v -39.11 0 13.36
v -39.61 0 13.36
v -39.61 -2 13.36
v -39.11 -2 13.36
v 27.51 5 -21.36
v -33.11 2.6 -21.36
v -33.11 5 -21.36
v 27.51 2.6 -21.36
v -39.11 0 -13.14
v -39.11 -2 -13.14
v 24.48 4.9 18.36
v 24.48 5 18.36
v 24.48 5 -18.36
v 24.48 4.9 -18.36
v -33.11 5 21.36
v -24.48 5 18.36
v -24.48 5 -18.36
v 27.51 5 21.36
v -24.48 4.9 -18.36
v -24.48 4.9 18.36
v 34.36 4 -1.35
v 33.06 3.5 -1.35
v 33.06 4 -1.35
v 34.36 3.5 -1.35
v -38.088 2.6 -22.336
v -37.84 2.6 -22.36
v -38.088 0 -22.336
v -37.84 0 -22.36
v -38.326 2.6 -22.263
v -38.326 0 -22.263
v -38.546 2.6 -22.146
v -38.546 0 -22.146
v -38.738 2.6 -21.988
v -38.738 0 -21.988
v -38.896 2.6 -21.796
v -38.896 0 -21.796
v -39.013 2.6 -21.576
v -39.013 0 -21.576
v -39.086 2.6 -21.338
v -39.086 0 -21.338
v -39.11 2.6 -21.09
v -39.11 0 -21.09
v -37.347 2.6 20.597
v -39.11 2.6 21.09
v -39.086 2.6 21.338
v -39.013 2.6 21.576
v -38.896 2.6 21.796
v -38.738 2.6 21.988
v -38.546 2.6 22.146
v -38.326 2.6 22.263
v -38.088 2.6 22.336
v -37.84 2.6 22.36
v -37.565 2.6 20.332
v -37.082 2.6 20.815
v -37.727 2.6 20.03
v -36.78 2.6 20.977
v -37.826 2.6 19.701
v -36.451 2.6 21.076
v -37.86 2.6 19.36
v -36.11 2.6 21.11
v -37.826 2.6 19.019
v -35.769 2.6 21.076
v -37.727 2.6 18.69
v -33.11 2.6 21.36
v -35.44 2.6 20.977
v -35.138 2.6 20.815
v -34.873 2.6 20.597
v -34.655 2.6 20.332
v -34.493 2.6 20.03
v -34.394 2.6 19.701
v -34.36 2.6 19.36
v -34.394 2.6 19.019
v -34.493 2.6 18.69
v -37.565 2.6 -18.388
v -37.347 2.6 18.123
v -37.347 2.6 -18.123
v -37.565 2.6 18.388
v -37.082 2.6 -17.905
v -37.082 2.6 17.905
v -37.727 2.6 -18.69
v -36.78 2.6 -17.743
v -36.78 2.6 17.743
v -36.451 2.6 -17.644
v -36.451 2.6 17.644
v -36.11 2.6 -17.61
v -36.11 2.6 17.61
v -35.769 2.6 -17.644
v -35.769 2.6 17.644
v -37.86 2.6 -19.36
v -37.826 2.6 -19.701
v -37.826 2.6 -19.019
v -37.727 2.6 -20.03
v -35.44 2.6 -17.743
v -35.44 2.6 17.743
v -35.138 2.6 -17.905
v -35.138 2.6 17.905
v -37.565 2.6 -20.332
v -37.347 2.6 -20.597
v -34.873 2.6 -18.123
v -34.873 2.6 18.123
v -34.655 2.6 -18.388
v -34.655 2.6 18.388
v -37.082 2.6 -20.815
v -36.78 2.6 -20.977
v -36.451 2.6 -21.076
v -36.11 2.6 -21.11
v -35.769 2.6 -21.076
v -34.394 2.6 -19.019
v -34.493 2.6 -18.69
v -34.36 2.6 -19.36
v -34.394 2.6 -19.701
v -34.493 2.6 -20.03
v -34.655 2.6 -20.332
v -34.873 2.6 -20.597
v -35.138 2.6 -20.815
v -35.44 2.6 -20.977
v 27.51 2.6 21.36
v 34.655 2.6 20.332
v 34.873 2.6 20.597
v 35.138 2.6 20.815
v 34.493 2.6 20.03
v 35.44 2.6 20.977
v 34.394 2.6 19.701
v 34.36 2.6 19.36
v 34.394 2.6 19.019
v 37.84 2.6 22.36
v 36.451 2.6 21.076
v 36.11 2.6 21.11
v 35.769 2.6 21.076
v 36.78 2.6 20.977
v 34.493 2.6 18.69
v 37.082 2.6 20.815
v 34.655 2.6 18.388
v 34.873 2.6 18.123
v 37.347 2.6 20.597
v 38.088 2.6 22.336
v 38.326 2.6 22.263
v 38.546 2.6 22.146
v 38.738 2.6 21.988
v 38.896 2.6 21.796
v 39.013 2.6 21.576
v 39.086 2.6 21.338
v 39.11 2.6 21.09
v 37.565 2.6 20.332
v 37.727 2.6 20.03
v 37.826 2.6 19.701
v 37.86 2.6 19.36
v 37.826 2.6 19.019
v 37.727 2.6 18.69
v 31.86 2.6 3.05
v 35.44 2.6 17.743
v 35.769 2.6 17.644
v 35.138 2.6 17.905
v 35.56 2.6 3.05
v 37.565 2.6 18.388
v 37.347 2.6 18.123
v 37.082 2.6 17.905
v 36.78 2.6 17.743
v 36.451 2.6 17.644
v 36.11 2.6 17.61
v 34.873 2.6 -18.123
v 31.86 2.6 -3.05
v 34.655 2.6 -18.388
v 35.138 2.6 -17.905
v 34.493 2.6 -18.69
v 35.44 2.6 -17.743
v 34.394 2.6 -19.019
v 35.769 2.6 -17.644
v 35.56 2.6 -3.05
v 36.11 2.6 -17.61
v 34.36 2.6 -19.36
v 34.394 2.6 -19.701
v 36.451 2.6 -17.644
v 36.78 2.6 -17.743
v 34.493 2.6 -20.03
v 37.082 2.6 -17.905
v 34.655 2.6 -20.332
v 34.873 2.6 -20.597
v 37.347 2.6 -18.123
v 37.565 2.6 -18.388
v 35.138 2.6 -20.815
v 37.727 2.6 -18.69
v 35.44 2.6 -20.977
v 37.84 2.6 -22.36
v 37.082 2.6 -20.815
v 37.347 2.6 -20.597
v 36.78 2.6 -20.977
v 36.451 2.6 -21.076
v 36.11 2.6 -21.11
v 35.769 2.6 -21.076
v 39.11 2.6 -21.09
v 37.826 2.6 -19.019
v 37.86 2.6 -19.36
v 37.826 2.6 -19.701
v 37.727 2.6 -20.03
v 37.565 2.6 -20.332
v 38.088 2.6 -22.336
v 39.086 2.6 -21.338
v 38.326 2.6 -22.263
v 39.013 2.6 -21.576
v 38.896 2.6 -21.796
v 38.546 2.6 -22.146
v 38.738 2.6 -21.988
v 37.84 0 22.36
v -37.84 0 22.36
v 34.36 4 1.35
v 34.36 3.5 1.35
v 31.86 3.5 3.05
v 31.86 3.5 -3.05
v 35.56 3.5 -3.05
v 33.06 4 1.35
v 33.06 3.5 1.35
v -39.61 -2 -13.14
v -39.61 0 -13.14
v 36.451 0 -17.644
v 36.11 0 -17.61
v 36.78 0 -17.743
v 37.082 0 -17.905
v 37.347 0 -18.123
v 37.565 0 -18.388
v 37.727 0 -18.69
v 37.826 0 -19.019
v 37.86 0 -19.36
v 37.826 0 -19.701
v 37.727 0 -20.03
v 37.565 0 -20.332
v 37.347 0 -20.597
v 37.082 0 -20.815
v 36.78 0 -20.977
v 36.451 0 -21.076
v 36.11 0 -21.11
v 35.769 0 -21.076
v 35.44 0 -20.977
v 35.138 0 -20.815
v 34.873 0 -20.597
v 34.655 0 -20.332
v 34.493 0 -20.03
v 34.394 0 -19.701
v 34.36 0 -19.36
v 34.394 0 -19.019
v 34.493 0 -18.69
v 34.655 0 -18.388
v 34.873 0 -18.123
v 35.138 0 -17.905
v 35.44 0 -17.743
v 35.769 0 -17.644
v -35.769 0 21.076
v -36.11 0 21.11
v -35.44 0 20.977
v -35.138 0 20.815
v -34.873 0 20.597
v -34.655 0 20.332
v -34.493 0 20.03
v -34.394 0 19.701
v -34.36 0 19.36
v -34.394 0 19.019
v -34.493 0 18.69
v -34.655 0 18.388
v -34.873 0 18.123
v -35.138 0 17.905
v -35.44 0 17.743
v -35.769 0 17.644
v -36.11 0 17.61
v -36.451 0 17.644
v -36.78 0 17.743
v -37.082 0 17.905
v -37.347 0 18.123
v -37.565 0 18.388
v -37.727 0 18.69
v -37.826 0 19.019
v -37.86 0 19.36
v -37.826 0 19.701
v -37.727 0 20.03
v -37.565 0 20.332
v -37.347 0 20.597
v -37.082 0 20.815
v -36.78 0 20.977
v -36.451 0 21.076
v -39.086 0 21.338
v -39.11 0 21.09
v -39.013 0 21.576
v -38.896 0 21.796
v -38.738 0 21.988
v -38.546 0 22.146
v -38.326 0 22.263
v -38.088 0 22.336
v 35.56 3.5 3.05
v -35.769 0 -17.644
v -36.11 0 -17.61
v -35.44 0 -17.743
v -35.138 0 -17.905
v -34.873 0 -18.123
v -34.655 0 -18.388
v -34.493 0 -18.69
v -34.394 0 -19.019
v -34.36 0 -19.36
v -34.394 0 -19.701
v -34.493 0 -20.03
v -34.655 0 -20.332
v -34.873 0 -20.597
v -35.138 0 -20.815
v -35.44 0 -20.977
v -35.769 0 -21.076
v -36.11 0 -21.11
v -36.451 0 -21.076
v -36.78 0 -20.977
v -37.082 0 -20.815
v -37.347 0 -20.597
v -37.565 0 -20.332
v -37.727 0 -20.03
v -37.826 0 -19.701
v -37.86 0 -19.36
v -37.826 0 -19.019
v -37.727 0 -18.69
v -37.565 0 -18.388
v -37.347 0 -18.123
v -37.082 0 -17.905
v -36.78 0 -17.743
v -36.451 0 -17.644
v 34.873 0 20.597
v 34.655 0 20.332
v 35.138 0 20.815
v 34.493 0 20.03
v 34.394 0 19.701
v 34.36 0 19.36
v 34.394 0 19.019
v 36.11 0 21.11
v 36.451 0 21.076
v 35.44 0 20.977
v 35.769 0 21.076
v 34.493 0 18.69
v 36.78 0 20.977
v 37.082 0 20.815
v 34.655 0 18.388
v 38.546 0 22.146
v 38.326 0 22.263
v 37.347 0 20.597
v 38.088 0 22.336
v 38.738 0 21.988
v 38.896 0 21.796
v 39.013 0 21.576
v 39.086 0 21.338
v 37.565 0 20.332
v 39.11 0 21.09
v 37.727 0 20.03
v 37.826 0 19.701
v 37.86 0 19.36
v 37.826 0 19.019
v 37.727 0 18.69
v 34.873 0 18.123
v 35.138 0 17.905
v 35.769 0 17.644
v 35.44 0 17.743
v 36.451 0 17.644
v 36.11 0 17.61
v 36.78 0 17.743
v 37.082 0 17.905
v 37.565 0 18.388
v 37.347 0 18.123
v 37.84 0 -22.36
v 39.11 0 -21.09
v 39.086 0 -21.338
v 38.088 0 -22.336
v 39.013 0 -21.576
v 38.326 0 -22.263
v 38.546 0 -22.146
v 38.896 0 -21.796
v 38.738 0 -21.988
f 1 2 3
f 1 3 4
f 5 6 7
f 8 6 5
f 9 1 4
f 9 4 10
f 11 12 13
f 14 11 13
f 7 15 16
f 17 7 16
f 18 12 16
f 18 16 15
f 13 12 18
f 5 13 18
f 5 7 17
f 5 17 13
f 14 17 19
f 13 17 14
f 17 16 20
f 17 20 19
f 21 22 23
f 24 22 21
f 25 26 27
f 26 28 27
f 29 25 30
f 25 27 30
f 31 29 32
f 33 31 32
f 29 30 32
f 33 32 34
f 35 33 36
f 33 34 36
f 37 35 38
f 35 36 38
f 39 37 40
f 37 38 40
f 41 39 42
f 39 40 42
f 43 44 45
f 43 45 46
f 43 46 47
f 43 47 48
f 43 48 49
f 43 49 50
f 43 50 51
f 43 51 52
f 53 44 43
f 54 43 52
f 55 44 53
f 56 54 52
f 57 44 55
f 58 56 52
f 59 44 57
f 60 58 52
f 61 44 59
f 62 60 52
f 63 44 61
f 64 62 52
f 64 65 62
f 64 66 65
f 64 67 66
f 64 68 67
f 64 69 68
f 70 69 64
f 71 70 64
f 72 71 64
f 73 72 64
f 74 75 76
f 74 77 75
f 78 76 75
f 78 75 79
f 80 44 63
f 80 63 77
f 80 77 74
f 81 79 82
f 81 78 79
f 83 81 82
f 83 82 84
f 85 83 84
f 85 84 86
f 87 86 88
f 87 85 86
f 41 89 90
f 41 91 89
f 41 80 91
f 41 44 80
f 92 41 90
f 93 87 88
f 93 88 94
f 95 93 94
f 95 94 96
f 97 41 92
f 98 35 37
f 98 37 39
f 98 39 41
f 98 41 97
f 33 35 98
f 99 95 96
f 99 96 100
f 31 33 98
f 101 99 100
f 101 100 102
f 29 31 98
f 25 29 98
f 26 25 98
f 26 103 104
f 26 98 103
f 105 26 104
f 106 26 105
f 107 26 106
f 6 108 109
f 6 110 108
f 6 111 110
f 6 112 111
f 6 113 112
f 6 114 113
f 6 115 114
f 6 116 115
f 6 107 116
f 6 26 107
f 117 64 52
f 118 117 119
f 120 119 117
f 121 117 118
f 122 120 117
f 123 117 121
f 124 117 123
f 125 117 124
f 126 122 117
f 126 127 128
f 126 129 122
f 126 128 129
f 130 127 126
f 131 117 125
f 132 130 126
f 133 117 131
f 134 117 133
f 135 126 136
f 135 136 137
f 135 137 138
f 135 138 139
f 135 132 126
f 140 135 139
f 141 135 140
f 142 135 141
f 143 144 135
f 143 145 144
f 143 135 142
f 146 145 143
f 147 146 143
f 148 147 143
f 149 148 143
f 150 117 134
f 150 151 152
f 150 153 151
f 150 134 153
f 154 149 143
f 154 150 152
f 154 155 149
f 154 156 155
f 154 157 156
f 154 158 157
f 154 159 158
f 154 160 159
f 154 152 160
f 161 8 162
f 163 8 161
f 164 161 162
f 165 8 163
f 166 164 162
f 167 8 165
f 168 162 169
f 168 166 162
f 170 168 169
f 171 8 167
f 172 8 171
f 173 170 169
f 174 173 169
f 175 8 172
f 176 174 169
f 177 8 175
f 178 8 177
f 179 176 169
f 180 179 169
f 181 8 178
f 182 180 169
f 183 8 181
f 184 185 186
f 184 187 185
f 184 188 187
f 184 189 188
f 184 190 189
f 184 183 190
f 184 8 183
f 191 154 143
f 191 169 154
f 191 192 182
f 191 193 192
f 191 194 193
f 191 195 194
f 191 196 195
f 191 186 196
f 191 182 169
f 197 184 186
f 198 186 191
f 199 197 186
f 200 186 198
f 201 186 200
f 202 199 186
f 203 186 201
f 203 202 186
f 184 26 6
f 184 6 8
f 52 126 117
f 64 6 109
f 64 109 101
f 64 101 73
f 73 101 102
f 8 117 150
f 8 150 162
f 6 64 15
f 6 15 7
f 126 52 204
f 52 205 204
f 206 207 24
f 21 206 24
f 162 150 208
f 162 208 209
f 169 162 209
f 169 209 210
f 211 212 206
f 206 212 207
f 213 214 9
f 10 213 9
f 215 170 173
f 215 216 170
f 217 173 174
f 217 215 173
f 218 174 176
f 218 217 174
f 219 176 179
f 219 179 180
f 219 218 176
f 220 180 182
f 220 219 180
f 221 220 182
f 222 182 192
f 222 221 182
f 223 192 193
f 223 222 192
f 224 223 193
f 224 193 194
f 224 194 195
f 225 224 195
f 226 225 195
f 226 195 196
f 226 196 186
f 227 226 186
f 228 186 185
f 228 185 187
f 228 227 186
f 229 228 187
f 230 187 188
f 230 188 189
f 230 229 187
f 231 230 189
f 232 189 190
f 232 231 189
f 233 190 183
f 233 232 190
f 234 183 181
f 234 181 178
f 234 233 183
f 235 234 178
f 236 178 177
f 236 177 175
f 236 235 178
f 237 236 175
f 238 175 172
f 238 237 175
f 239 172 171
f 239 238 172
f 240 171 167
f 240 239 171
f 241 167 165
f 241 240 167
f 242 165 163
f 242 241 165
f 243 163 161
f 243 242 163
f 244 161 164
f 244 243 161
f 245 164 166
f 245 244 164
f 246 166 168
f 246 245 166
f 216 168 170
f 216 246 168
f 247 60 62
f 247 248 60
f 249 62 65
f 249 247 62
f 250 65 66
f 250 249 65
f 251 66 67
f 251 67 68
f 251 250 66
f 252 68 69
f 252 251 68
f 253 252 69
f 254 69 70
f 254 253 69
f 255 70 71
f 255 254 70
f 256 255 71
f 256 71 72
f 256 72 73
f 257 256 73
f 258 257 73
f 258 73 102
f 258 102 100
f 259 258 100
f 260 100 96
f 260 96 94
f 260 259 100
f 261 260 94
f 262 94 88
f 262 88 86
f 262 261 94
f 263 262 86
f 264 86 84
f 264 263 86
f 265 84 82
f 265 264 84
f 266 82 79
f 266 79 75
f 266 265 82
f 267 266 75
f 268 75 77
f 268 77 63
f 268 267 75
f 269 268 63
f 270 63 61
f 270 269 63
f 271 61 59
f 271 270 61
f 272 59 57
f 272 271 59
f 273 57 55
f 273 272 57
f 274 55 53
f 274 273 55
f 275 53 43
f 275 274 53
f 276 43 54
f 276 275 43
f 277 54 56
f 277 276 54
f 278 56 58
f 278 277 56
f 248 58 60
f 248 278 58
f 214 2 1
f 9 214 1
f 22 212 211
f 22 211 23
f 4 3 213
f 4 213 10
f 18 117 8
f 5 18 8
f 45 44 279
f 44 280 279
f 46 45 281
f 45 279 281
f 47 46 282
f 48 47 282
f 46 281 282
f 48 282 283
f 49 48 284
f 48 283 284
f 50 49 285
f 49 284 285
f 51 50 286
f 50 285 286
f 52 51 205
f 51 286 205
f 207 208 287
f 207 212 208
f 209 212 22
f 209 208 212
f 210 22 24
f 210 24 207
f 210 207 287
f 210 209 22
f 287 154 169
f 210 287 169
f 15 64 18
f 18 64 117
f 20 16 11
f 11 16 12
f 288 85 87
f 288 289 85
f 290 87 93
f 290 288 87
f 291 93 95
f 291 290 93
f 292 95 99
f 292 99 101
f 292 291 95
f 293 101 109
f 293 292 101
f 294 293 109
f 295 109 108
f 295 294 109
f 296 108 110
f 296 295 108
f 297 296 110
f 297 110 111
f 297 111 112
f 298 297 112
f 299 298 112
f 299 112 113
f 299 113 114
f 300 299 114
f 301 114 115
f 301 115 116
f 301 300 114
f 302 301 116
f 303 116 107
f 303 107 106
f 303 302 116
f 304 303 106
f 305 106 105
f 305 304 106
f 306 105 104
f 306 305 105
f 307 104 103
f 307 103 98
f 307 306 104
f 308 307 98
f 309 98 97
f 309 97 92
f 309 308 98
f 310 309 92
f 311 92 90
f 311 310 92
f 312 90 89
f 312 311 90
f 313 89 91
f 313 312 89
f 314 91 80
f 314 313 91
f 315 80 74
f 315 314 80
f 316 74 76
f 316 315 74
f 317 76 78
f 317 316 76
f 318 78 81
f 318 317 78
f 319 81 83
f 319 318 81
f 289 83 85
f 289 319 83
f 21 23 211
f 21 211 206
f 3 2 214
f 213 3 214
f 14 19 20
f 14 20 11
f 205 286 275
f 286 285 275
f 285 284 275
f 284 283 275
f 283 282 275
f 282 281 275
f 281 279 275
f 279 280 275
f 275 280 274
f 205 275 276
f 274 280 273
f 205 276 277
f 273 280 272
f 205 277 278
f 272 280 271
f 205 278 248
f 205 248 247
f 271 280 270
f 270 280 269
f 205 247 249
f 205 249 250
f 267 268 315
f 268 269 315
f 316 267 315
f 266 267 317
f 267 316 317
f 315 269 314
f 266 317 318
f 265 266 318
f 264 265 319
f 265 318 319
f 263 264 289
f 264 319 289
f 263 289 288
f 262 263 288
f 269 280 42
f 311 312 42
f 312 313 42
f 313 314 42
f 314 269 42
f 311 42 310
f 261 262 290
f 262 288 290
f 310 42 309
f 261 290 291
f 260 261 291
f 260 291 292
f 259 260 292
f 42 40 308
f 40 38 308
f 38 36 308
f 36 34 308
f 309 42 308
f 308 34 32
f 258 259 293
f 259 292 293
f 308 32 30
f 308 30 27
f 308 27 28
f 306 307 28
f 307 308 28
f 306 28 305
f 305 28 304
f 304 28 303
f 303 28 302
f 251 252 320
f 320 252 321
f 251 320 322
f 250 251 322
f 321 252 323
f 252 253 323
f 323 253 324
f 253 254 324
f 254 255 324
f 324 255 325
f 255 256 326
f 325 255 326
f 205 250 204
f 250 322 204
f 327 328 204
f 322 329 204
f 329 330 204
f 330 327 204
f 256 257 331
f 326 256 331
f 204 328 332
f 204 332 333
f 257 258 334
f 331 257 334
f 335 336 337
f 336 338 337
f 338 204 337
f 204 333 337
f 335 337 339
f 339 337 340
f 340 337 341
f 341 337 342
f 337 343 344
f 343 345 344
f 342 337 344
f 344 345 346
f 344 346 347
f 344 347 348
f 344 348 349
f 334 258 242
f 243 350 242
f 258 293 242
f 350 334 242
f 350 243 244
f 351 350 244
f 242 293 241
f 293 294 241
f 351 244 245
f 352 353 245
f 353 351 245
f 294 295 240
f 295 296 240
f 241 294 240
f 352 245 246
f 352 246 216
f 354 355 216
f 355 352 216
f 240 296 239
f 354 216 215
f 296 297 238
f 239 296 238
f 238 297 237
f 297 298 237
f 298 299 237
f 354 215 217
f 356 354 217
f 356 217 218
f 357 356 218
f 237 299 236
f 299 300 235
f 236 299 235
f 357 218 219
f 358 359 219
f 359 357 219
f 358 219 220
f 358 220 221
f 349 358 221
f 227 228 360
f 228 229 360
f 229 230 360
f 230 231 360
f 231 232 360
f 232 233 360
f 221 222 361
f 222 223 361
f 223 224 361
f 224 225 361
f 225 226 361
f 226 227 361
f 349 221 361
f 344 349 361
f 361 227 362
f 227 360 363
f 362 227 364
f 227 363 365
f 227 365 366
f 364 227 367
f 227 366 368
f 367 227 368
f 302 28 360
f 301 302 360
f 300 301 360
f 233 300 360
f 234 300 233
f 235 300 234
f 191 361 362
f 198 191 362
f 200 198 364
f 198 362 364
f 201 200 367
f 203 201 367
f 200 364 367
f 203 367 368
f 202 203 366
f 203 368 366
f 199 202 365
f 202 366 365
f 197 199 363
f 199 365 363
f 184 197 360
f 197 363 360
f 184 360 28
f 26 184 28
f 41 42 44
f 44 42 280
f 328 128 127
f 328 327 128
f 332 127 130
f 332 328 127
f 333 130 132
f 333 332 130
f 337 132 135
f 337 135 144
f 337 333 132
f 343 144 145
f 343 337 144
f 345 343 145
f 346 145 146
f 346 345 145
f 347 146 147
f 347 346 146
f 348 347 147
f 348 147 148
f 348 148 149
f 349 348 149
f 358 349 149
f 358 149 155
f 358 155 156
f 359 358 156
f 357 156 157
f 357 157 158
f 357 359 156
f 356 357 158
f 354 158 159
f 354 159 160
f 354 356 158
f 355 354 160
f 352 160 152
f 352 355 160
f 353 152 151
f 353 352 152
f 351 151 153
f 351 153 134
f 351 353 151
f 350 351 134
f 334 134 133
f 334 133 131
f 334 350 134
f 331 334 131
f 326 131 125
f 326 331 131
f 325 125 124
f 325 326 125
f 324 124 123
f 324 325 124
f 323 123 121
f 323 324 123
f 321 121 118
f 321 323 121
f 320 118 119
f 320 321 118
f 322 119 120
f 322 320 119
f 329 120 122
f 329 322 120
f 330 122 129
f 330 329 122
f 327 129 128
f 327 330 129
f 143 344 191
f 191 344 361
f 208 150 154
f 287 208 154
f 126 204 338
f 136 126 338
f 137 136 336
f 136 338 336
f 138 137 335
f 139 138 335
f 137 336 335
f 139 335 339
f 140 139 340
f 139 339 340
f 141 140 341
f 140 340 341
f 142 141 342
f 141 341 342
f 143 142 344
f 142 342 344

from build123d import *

# Parameters (mm, degrees)
SKETCH_1_R          = 1.75
EXTRUDE_1_DEPTH     = 1.6
SKETCH_1_3_W        = 60.62
SKETCH_1_3_H        = 42.72
SKETCH_1_3_W_2      = 48.96
SKETCH_1_3_H_2      = 36.72
EXTRUDE_2_DEPTH     = 5
EXTRUDE_START       = 1.6
SKETCH_1_4_R        = 1.75
SKETCH_1_4_W        = 60.62
SKETCH_1_4_H        = 42.72
SKETCH_1_4_W_2      = 1.3
SKETCH_1_4_H_2      = 2.7
EXTRUDE_3_DEPTH     = 1
CUT_EXTRUDE_START   = 5
SKETCH_1_5_W        = 48.96
SKETCH_1_5_H        = 36.72
CUT_EXTRUDE_1_DEPTH = 0.1
SKETCH_1_6_W        = 3.7
SKETCH_1_6_H        = 6.1
SKETCH_1_6_W_2      = 1.3
SKETCH_1_6_H_2      = 2.7
EXTRUDE_4_DEPTH     = 3.5
SKETCH_1_7_W        = 1.3
SKETCH_1_7_H        = 2.7
EXTRUDE_5_DEPTH     = 4
SKETCH_2_W          = 0.5
SKETCH_2_H          = 26.5
EXTRUDE_6_DEPTH     = 2


with BuildPart() as part:
    # 草图1 → 凸台-拉伸1 (new body)
    with BuildSketch(Plane(origin=(0, 0, 0), x_dir=(1, 0, 0), z_dir=(0, 1, 0))):
        with BuildLine():
            Line((-37.84, 22.36), (37.84, 22.36))
            ThreePointArc((37.84, 22.36), (38.738025612, 21.988025612), (39.11, 21.09))
            Line((39.11, 21.09), (39.11, -21.09))
            ThreePointArc((39.11, -21.09), (38.738025612, -21.988025612), (37.84, -22.36))
            Line((37.84, -22.36), (-37.84, -22.36))
            ThreePointArc((-37.84, -22.36), (-38.738025612, -21.988025612), (-39.11, -21.09))
            Line((-39.11, -21.09), (-39.11, 21.09))
            ThreePointArc((-39.11, 21.09), (-38.738025612, 21.988025612), (-37.84, 22.36))
        make_face()
        with Locations(Location((-36.11, -19.36, 0), (0, 0, 270))):
            Circle(SKETCH_1_R, mode=Mode.SUBTRACT)
        with Locations(Location((36.11, -19.36, 0), (0, 0, 270))):
            Circle(SKETCH_1_R, mode=Mode.SUBTRACT)
        with Locations(Location((-36.11, 19.36, 0), (0, 0, 270))):
            Circle(SKETCH_1_R, mode=Mode.SUBTRACT)
        with Locations(Location((36.11, 19.36, 0), (0, 0, 270))):
            Circle(SKETCH_1_R, mode=Mode.SUBTRACT)
    extrude(amount=EXTRUDE_1_DEPTH)

    # 草图1<3> → 凸台-拉伸2 (add)
    with BuildSketch(Plane(origin=(0, 0, 0), x_dir=(1, 0, 0), z_dir=(0, 1, 0))):
        with Locations((-2.8, 0)):
            Rectangle(SKETCH_1_3_W, SKETCH_1_3_H)
        Rectangle(SKETCH_1_3_W_2, SKETCH_1_3_H_2)
    extrude(amount=EXTRUDE_2_DEPTH)

    # 草图1<4> → 凸台-拉伸3 (add)
    with BuildSketch(Plane(origin=(0, 0, 0), x_dir=(1, 0, 0), z_dir=(0, 1, 0)).offset(EXTRUDE_START)):
        with BuildLine():
            Line((37.84, 22.36), (-37.84, 22.36))
            ThreePointArc((-37.84, 22.36), (-38.738025612, 21.988025612), (-39.11, 21.09))
            Line((-39.11, 21.09), (-39.11, -21.09))
            ThreePointArc((-39.11, -21.09), (-38.738025612, -21.988025612), (-37.84, -22.36))
            Line((-37.84, -22.36), (37.84, -22.36))
            ThreePointArc((37.84, -22.36), (38.738025612, -21.988025612), (39.11, -21.09))
            Line((39.11, -21.09), (39.11, 21.09))
            ThreePointArc((39.11, 21.09), (38.738025612, 21.988025612), (37.84, 22.36))
        make_face()
        with Locations(Location((-36.11, -19.36, 0), (0, 0, 270))):
            Circle(SKETCH_1_4_R, mode=Mode.SUBTRACT)
        with Locations(Location((36.11, -19.36, 0), (0, 0, 270))):
            Circle(SKETCH_1_4_R, mode=Mode.SUBTRACT)
        with Locations((-2.8, 0)):
            Rectangle(SKETCH_1_4_W, SKETCH_1_4_H, mode=Mode.SUBTRACT)
        with Locations(Location((-36.11, 19.36, 0), (0, 0, 270))):
            Circle(SKETCH_1_4_R, mode=Mode.SUBTRACT)
        with Locations(Location((36.11, 19.36, 0), (0, 0, 270))):
            Circle(SKETCH_1_4_R, mode=Mode.SUBTRACT)
        with Locations((33.71, 0)):
            Rectangle(SKETCH_1_4_W_2, SKETCH_1_4_H_2, mode=Mode.SUBTRACT)
    extrude(amount=EXTRUDE_3_DEPTH)

    # 草图1<5> → 切除-拉伸1 (cut)
    with BuildSketch(Plane(origin=(0, 0, 0), x_dir=(1, 0, 0), z_dir=(0, 1, 0)).offset(CUT_EXTRUDE_START)):
        Rectangle(SKETCH_1_5_W, SKETCH_1_5_H)
    extrude(amount=-CUT_EXTRUDE_1_DEPTH, mode=Mode.SUBTRACT)

    # 草图1<6> → 凸台-拉伸4 (add)
    with BuildSketch(Plane(origin=(0, 0, 0), x_dir=(1, 0, 0), z_dir=(0, 1, 0))):
        with Locations((33.71, 0)):
            Rectangle(SKETCH_1_6_W, SKETCH_1_6_H)
        with Locations((33.71, 0)):
            Rectangle(SKETCH_1_6_W_2, SKETCH_1_6_H_2, mode=Mode.SUBTRACT)
    extrude(amount=EXTRUDE_4_DEPTH)

    # 草图1<7> → 凸台-拉伸5 (add)
    with BuildSketch(Plane(origin=(0, 0, 0), x_dir=(1, 0, 0), z_dir=(0, 1, 0))):
        with Locations((33.71, 0)):
            Rectangle(SKETCH_1_7_W, SKETCH_1_7_H)
    extrude(amount=EXTRUDE_5_DEPTH)


with BuildPart() as body_2:
    # 草图2 → 凸台-拉伸6 (new body)
    with BuildSketch(Plane(origin=(0, 0, 0), x_dir=(1, 0, 0), z_dir=(0, 1, 0))):
        with Locations((-39.36, -0.11)):
            Rectangle(SKETCH_2_W, SKETCH_2_H)
    extrude(amount=-EXTRUDE_6_DEPTH)


solid = Compound([part.part, body_2.part])
